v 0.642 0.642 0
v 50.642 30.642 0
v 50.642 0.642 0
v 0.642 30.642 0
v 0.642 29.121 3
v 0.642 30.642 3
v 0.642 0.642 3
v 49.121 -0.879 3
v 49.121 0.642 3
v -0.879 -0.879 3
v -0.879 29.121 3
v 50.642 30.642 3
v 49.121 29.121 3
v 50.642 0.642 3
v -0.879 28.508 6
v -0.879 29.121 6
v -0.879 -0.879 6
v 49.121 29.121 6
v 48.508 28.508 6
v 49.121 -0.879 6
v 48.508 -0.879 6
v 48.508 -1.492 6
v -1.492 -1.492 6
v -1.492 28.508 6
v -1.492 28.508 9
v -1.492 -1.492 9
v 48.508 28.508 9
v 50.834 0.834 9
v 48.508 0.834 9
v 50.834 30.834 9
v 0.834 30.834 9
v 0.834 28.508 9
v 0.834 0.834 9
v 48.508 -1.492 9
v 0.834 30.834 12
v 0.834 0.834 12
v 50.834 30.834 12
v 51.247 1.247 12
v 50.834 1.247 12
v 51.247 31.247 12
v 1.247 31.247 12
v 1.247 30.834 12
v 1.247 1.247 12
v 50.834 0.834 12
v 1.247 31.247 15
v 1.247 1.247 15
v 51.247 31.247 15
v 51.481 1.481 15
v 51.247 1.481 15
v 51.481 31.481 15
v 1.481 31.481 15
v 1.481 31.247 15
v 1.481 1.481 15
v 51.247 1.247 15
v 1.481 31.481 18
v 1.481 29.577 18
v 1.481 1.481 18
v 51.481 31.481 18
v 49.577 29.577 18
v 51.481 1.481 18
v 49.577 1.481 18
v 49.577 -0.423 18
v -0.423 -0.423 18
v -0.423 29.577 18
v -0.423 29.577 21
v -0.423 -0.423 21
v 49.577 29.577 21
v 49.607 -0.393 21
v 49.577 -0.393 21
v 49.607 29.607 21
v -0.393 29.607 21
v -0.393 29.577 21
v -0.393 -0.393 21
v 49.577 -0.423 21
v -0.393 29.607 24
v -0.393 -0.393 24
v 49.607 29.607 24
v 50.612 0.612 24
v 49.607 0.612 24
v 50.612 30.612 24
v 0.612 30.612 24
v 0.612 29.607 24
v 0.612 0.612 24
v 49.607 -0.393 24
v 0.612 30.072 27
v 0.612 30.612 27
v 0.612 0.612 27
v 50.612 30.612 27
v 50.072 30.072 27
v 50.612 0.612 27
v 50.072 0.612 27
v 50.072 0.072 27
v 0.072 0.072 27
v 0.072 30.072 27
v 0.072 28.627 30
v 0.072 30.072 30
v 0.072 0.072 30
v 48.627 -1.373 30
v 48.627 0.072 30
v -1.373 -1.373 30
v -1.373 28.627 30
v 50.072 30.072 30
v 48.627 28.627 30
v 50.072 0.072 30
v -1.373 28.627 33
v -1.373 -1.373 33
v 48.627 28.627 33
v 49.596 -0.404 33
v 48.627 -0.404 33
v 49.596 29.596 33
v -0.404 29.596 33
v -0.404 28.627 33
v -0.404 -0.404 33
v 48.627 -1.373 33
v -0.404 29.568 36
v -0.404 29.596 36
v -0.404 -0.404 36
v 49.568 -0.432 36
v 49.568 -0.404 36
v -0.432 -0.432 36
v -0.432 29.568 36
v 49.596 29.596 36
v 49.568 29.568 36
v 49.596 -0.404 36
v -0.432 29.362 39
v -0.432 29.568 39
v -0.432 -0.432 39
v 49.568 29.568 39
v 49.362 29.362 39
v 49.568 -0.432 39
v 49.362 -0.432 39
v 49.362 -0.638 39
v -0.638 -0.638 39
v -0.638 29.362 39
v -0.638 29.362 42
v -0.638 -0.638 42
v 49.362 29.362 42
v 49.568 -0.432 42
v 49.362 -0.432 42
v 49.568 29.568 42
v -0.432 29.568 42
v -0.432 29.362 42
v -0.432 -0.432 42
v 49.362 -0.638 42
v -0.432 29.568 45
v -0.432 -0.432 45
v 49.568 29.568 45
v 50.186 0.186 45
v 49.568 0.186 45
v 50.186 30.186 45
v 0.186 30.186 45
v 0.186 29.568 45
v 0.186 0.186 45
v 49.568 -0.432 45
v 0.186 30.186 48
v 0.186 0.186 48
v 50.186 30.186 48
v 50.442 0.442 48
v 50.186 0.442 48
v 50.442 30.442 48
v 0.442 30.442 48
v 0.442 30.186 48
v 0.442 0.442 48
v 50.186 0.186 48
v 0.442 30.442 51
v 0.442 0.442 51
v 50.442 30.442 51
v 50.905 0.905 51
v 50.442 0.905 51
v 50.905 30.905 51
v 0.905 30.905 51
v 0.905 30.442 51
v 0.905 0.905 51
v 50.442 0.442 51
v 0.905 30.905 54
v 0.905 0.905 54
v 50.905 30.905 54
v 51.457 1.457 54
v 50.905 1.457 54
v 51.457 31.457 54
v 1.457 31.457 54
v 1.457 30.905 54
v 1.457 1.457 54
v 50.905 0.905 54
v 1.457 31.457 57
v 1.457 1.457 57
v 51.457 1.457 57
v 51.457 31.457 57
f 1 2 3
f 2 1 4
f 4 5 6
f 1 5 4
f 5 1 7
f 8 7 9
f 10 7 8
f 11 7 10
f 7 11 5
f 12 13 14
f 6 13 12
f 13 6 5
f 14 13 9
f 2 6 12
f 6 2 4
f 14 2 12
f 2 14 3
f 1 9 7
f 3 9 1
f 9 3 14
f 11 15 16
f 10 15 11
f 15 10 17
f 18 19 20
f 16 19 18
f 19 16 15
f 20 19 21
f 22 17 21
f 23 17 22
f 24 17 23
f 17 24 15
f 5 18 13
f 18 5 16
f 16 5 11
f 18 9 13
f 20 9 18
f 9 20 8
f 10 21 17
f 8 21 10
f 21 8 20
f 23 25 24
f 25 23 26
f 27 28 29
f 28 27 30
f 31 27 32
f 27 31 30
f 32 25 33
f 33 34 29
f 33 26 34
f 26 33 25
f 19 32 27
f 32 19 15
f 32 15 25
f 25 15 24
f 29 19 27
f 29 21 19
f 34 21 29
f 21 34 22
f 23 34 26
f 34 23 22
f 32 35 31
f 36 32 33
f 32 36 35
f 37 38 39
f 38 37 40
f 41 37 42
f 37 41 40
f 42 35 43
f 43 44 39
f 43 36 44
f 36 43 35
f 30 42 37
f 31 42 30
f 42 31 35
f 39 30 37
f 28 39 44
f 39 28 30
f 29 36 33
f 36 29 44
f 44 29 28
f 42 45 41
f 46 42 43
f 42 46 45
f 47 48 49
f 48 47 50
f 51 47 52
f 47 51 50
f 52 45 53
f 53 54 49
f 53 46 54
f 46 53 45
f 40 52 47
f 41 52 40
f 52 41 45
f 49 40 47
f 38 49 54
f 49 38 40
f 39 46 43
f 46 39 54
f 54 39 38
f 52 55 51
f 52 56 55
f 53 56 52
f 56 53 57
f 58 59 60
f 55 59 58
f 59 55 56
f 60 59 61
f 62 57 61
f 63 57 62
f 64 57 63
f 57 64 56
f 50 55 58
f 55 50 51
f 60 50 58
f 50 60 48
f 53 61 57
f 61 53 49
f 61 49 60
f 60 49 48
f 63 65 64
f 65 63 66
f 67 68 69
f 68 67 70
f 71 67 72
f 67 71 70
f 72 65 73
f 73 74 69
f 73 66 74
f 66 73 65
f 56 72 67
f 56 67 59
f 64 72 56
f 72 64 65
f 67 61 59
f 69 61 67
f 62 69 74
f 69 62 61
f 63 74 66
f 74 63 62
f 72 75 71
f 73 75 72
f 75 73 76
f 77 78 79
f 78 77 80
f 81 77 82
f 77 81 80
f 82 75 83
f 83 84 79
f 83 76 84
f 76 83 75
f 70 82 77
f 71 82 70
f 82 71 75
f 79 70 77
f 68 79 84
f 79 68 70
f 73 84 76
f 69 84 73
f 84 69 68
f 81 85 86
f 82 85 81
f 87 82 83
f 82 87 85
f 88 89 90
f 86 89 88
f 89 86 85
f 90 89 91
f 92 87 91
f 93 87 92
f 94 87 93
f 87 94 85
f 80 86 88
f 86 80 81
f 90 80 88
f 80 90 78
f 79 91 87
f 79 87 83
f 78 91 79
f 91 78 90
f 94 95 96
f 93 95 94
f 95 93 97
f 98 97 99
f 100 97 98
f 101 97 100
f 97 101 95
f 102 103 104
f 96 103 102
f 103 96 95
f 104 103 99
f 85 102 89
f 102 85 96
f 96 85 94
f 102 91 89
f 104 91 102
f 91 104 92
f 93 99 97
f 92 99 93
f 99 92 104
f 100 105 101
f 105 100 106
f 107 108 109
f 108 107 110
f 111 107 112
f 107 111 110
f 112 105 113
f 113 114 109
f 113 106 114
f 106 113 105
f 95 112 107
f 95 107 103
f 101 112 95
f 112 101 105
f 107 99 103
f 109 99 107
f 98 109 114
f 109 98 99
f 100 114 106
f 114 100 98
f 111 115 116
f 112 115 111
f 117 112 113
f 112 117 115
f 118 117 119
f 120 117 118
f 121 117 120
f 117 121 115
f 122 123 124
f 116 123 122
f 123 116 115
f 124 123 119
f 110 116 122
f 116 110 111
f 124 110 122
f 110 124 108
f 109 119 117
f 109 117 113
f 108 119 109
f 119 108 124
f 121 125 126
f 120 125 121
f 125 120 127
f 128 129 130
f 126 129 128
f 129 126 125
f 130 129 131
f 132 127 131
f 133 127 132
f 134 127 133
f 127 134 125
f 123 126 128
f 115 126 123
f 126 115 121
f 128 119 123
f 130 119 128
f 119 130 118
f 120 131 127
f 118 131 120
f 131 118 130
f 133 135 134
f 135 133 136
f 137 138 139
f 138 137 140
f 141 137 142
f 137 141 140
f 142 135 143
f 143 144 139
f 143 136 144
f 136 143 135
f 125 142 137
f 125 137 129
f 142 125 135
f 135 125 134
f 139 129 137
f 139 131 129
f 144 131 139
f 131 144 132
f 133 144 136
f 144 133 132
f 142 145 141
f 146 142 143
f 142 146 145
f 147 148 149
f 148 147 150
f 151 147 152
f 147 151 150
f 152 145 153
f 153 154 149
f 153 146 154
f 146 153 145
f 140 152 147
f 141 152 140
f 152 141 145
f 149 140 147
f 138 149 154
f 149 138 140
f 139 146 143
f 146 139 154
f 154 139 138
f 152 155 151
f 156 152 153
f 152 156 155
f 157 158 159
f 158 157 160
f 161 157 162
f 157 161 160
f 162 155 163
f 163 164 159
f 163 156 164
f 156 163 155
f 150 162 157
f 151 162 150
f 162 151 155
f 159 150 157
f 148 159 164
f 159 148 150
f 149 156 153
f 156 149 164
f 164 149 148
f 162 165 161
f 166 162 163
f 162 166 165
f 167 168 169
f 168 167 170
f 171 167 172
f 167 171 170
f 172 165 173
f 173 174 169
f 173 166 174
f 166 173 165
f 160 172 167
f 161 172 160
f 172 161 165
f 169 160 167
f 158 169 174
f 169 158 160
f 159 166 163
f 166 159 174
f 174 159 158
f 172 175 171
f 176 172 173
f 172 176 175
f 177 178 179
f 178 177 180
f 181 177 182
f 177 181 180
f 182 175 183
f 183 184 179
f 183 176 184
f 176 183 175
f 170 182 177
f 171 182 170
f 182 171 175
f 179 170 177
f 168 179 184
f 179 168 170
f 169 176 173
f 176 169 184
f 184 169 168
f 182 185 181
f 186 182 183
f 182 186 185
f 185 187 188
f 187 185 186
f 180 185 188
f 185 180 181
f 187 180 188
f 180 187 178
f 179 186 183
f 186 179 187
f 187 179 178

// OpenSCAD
// pisa

x=50;
y=30;
z=55;

bleed=.5;
walls=4;
var=walls*.75;

module statsbygg(size, bleed=.5, var=1, stepsize=1, rseedx, rseedy) {
    x = size[0];
    y = size[1];
    
    // init random
    rmin = -var;                    // float
    rmax = var;                     // float

    rvals = size[2]+1;              // int - veit ikke om jeg trenger z+1, men skader ikke
    srand = rands(0,99999,2);  // trengs hvis ikke angitt
    
    rsx = (rseedx == undef) ? srand[0] : rseedx;
    rsy = (rseedy == undef && rsx != undef) ? rsx : 
          (rseedy == undef && rsy == undef) ? srand[1] : rseedy;
    
    xrand = rands(rmin, rmax, rvals, rsx);
    yrand = rands(rmin, rmax, rvals, rsy);
    
    echo("Starting the fun with srand", srand, ", rsx, ", rsx, " and rsy ", rsy);
    xpos = 0;
    ypos = 0;
    
    for (z = [0:stepsize:size[2]]) {
        xpos = xpos + xrand[z];
        ypos = ypos + yrand[z];
        translate([xpos,ypos,z])
            linear_extrude(stepsize)
                square([x+bleed*2,y+bleed*2]);
                //square([size[0]+bleed*2,size[1]+bleed*2]);
    }
}

module ramme(size, walls=3, bleed=.5) {
    translate([bleed,bleed]) {
        difference() {
            translate([-bleed,-bleed])
                square([size[0]+bleed*2,size[1]+bleed*2]);
            translate([walls,walls]) {
                square([size[0]-walls*2,size[1]-walls*2]);
            }
        }
    }
}


statsbygg(size=[x,y,z], bleed=0, var=1.5, stepsize=3);
